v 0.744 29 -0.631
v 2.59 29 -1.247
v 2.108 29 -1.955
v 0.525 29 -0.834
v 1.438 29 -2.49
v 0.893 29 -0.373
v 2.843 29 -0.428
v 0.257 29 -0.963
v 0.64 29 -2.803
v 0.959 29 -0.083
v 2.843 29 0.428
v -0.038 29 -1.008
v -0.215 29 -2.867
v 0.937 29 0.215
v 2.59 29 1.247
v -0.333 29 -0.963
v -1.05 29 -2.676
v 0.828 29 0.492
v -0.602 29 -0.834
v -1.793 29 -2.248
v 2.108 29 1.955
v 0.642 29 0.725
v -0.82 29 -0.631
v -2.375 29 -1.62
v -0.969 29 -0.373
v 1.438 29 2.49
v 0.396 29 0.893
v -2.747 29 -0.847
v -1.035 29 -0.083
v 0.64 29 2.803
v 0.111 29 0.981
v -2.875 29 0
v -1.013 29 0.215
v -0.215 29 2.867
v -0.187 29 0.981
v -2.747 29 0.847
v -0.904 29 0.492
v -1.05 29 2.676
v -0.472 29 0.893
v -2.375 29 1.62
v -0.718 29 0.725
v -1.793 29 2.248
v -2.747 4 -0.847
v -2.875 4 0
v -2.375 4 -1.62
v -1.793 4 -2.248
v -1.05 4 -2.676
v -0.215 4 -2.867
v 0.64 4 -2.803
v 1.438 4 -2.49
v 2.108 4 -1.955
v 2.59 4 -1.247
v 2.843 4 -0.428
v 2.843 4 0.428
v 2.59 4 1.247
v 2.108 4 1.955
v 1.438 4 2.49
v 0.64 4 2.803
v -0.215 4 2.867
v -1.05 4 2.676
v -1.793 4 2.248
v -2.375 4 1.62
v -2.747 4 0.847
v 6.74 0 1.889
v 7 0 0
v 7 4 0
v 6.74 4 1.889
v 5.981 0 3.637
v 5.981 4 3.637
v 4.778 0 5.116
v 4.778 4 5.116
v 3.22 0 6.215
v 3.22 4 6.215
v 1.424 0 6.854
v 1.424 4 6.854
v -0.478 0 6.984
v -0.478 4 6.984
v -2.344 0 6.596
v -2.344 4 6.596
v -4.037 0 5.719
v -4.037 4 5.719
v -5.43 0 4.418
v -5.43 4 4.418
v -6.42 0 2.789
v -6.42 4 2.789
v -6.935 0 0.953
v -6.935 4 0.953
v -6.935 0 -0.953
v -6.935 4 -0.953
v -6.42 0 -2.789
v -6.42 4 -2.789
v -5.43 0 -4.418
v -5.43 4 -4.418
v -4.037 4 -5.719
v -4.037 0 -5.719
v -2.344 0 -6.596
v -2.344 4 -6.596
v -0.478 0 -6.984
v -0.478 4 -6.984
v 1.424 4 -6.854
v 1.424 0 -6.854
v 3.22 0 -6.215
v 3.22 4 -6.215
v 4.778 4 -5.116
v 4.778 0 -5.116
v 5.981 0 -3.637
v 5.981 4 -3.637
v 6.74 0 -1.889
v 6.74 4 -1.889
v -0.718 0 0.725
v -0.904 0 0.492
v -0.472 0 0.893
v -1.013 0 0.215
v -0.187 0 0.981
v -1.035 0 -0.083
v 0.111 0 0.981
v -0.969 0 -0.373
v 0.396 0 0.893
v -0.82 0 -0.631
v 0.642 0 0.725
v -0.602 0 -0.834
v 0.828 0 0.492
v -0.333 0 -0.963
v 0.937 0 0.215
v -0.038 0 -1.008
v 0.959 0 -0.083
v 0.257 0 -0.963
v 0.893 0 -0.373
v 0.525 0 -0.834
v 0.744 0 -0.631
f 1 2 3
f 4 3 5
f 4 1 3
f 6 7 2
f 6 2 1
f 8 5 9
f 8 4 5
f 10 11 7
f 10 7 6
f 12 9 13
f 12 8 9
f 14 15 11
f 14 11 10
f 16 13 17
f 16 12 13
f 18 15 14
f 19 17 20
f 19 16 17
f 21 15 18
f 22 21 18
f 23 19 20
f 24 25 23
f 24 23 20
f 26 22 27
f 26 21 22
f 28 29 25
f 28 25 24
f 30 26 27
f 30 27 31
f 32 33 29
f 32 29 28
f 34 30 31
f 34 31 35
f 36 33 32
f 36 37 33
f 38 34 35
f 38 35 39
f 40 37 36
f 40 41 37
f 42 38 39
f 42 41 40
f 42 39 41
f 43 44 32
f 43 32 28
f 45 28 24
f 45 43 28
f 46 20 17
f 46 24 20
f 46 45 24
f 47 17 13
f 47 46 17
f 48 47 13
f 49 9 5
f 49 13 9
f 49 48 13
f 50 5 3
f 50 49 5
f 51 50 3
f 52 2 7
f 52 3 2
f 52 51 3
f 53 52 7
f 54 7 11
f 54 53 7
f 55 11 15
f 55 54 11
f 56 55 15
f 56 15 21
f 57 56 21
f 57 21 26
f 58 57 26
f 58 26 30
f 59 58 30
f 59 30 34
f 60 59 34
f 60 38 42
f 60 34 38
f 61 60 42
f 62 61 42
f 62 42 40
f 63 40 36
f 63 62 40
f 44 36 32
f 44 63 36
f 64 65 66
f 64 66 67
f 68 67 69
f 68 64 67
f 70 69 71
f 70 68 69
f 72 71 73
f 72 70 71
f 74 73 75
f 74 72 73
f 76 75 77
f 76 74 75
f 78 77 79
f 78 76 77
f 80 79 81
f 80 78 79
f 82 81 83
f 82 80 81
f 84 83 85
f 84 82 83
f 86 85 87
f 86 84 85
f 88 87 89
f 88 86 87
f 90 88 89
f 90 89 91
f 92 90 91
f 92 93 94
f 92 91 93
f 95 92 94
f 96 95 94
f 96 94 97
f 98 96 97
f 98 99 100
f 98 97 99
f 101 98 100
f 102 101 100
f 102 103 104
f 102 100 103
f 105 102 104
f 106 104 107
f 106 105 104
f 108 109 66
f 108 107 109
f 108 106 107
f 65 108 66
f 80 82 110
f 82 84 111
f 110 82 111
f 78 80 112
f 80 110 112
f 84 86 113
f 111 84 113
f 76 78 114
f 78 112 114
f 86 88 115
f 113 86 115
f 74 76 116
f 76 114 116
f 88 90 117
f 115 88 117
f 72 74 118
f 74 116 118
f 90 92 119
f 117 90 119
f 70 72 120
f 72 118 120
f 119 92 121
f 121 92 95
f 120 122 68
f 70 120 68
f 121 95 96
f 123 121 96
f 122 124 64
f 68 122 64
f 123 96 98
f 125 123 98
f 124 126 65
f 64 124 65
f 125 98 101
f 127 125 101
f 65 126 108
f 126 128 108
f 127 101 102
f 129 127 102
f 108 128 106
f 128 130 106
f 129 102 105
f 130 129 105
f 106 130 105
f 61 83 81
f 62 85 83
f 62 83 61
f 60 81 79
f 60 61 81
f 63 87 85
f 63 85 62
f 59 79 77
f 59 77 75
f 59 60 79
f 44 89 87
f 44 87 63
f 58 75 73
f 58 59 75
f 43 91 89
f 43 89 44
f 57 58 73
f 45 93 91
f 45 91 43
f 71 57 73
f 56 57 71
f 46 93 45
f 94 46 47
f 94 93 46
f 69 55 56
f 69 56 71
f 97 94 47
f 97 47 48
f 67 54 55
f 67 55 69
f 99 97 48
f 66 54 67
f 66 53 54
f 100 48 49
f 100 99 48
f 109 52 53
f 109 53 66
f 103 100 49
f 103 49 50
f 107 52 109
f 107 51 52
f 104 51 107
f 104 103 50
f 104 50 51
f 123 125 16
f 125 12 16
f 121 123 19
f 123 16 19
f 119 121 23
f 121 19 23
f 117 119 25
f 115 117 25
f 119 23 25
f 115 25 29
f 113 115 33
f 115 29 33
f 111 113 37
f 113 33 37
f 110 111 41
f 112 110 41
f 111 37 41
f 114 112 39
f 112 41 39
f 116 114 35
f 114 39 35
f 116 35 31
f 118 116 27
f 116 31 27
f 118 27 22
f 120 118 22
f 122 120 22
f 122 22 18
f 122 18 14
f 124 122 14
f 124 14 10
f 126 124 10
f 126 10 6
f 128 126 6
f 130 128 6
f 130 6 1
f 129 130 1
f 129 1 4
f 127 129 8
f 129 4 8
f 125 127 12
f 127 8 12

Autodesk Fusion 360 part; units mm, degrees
sketch "Base" plane through (0, 0, 0) normal (0, 1, 0) x (1, 0, 0)
  circle A0 centre (0, 0) radius 7
  dimension "d1" = 14
extrude "Extrude1" add sketch "Base" along normal blind 4
sketch "Pin" plane through (0, 4, 0) normal (0, 1, 0) x (-1, 0, 0)
  circle A0 centre (0, 0) radius 7
  circle A1 centre (0, 0) radius 2.875
  dimension "d4" = 5.75
extrude "Extrude2" add sketch "Pin" along normal blind 25 contours A1
hole "Hole1" at (-0.0382, 0, -0.0078) direction (0, 1, 0) diameter 2 end through all
